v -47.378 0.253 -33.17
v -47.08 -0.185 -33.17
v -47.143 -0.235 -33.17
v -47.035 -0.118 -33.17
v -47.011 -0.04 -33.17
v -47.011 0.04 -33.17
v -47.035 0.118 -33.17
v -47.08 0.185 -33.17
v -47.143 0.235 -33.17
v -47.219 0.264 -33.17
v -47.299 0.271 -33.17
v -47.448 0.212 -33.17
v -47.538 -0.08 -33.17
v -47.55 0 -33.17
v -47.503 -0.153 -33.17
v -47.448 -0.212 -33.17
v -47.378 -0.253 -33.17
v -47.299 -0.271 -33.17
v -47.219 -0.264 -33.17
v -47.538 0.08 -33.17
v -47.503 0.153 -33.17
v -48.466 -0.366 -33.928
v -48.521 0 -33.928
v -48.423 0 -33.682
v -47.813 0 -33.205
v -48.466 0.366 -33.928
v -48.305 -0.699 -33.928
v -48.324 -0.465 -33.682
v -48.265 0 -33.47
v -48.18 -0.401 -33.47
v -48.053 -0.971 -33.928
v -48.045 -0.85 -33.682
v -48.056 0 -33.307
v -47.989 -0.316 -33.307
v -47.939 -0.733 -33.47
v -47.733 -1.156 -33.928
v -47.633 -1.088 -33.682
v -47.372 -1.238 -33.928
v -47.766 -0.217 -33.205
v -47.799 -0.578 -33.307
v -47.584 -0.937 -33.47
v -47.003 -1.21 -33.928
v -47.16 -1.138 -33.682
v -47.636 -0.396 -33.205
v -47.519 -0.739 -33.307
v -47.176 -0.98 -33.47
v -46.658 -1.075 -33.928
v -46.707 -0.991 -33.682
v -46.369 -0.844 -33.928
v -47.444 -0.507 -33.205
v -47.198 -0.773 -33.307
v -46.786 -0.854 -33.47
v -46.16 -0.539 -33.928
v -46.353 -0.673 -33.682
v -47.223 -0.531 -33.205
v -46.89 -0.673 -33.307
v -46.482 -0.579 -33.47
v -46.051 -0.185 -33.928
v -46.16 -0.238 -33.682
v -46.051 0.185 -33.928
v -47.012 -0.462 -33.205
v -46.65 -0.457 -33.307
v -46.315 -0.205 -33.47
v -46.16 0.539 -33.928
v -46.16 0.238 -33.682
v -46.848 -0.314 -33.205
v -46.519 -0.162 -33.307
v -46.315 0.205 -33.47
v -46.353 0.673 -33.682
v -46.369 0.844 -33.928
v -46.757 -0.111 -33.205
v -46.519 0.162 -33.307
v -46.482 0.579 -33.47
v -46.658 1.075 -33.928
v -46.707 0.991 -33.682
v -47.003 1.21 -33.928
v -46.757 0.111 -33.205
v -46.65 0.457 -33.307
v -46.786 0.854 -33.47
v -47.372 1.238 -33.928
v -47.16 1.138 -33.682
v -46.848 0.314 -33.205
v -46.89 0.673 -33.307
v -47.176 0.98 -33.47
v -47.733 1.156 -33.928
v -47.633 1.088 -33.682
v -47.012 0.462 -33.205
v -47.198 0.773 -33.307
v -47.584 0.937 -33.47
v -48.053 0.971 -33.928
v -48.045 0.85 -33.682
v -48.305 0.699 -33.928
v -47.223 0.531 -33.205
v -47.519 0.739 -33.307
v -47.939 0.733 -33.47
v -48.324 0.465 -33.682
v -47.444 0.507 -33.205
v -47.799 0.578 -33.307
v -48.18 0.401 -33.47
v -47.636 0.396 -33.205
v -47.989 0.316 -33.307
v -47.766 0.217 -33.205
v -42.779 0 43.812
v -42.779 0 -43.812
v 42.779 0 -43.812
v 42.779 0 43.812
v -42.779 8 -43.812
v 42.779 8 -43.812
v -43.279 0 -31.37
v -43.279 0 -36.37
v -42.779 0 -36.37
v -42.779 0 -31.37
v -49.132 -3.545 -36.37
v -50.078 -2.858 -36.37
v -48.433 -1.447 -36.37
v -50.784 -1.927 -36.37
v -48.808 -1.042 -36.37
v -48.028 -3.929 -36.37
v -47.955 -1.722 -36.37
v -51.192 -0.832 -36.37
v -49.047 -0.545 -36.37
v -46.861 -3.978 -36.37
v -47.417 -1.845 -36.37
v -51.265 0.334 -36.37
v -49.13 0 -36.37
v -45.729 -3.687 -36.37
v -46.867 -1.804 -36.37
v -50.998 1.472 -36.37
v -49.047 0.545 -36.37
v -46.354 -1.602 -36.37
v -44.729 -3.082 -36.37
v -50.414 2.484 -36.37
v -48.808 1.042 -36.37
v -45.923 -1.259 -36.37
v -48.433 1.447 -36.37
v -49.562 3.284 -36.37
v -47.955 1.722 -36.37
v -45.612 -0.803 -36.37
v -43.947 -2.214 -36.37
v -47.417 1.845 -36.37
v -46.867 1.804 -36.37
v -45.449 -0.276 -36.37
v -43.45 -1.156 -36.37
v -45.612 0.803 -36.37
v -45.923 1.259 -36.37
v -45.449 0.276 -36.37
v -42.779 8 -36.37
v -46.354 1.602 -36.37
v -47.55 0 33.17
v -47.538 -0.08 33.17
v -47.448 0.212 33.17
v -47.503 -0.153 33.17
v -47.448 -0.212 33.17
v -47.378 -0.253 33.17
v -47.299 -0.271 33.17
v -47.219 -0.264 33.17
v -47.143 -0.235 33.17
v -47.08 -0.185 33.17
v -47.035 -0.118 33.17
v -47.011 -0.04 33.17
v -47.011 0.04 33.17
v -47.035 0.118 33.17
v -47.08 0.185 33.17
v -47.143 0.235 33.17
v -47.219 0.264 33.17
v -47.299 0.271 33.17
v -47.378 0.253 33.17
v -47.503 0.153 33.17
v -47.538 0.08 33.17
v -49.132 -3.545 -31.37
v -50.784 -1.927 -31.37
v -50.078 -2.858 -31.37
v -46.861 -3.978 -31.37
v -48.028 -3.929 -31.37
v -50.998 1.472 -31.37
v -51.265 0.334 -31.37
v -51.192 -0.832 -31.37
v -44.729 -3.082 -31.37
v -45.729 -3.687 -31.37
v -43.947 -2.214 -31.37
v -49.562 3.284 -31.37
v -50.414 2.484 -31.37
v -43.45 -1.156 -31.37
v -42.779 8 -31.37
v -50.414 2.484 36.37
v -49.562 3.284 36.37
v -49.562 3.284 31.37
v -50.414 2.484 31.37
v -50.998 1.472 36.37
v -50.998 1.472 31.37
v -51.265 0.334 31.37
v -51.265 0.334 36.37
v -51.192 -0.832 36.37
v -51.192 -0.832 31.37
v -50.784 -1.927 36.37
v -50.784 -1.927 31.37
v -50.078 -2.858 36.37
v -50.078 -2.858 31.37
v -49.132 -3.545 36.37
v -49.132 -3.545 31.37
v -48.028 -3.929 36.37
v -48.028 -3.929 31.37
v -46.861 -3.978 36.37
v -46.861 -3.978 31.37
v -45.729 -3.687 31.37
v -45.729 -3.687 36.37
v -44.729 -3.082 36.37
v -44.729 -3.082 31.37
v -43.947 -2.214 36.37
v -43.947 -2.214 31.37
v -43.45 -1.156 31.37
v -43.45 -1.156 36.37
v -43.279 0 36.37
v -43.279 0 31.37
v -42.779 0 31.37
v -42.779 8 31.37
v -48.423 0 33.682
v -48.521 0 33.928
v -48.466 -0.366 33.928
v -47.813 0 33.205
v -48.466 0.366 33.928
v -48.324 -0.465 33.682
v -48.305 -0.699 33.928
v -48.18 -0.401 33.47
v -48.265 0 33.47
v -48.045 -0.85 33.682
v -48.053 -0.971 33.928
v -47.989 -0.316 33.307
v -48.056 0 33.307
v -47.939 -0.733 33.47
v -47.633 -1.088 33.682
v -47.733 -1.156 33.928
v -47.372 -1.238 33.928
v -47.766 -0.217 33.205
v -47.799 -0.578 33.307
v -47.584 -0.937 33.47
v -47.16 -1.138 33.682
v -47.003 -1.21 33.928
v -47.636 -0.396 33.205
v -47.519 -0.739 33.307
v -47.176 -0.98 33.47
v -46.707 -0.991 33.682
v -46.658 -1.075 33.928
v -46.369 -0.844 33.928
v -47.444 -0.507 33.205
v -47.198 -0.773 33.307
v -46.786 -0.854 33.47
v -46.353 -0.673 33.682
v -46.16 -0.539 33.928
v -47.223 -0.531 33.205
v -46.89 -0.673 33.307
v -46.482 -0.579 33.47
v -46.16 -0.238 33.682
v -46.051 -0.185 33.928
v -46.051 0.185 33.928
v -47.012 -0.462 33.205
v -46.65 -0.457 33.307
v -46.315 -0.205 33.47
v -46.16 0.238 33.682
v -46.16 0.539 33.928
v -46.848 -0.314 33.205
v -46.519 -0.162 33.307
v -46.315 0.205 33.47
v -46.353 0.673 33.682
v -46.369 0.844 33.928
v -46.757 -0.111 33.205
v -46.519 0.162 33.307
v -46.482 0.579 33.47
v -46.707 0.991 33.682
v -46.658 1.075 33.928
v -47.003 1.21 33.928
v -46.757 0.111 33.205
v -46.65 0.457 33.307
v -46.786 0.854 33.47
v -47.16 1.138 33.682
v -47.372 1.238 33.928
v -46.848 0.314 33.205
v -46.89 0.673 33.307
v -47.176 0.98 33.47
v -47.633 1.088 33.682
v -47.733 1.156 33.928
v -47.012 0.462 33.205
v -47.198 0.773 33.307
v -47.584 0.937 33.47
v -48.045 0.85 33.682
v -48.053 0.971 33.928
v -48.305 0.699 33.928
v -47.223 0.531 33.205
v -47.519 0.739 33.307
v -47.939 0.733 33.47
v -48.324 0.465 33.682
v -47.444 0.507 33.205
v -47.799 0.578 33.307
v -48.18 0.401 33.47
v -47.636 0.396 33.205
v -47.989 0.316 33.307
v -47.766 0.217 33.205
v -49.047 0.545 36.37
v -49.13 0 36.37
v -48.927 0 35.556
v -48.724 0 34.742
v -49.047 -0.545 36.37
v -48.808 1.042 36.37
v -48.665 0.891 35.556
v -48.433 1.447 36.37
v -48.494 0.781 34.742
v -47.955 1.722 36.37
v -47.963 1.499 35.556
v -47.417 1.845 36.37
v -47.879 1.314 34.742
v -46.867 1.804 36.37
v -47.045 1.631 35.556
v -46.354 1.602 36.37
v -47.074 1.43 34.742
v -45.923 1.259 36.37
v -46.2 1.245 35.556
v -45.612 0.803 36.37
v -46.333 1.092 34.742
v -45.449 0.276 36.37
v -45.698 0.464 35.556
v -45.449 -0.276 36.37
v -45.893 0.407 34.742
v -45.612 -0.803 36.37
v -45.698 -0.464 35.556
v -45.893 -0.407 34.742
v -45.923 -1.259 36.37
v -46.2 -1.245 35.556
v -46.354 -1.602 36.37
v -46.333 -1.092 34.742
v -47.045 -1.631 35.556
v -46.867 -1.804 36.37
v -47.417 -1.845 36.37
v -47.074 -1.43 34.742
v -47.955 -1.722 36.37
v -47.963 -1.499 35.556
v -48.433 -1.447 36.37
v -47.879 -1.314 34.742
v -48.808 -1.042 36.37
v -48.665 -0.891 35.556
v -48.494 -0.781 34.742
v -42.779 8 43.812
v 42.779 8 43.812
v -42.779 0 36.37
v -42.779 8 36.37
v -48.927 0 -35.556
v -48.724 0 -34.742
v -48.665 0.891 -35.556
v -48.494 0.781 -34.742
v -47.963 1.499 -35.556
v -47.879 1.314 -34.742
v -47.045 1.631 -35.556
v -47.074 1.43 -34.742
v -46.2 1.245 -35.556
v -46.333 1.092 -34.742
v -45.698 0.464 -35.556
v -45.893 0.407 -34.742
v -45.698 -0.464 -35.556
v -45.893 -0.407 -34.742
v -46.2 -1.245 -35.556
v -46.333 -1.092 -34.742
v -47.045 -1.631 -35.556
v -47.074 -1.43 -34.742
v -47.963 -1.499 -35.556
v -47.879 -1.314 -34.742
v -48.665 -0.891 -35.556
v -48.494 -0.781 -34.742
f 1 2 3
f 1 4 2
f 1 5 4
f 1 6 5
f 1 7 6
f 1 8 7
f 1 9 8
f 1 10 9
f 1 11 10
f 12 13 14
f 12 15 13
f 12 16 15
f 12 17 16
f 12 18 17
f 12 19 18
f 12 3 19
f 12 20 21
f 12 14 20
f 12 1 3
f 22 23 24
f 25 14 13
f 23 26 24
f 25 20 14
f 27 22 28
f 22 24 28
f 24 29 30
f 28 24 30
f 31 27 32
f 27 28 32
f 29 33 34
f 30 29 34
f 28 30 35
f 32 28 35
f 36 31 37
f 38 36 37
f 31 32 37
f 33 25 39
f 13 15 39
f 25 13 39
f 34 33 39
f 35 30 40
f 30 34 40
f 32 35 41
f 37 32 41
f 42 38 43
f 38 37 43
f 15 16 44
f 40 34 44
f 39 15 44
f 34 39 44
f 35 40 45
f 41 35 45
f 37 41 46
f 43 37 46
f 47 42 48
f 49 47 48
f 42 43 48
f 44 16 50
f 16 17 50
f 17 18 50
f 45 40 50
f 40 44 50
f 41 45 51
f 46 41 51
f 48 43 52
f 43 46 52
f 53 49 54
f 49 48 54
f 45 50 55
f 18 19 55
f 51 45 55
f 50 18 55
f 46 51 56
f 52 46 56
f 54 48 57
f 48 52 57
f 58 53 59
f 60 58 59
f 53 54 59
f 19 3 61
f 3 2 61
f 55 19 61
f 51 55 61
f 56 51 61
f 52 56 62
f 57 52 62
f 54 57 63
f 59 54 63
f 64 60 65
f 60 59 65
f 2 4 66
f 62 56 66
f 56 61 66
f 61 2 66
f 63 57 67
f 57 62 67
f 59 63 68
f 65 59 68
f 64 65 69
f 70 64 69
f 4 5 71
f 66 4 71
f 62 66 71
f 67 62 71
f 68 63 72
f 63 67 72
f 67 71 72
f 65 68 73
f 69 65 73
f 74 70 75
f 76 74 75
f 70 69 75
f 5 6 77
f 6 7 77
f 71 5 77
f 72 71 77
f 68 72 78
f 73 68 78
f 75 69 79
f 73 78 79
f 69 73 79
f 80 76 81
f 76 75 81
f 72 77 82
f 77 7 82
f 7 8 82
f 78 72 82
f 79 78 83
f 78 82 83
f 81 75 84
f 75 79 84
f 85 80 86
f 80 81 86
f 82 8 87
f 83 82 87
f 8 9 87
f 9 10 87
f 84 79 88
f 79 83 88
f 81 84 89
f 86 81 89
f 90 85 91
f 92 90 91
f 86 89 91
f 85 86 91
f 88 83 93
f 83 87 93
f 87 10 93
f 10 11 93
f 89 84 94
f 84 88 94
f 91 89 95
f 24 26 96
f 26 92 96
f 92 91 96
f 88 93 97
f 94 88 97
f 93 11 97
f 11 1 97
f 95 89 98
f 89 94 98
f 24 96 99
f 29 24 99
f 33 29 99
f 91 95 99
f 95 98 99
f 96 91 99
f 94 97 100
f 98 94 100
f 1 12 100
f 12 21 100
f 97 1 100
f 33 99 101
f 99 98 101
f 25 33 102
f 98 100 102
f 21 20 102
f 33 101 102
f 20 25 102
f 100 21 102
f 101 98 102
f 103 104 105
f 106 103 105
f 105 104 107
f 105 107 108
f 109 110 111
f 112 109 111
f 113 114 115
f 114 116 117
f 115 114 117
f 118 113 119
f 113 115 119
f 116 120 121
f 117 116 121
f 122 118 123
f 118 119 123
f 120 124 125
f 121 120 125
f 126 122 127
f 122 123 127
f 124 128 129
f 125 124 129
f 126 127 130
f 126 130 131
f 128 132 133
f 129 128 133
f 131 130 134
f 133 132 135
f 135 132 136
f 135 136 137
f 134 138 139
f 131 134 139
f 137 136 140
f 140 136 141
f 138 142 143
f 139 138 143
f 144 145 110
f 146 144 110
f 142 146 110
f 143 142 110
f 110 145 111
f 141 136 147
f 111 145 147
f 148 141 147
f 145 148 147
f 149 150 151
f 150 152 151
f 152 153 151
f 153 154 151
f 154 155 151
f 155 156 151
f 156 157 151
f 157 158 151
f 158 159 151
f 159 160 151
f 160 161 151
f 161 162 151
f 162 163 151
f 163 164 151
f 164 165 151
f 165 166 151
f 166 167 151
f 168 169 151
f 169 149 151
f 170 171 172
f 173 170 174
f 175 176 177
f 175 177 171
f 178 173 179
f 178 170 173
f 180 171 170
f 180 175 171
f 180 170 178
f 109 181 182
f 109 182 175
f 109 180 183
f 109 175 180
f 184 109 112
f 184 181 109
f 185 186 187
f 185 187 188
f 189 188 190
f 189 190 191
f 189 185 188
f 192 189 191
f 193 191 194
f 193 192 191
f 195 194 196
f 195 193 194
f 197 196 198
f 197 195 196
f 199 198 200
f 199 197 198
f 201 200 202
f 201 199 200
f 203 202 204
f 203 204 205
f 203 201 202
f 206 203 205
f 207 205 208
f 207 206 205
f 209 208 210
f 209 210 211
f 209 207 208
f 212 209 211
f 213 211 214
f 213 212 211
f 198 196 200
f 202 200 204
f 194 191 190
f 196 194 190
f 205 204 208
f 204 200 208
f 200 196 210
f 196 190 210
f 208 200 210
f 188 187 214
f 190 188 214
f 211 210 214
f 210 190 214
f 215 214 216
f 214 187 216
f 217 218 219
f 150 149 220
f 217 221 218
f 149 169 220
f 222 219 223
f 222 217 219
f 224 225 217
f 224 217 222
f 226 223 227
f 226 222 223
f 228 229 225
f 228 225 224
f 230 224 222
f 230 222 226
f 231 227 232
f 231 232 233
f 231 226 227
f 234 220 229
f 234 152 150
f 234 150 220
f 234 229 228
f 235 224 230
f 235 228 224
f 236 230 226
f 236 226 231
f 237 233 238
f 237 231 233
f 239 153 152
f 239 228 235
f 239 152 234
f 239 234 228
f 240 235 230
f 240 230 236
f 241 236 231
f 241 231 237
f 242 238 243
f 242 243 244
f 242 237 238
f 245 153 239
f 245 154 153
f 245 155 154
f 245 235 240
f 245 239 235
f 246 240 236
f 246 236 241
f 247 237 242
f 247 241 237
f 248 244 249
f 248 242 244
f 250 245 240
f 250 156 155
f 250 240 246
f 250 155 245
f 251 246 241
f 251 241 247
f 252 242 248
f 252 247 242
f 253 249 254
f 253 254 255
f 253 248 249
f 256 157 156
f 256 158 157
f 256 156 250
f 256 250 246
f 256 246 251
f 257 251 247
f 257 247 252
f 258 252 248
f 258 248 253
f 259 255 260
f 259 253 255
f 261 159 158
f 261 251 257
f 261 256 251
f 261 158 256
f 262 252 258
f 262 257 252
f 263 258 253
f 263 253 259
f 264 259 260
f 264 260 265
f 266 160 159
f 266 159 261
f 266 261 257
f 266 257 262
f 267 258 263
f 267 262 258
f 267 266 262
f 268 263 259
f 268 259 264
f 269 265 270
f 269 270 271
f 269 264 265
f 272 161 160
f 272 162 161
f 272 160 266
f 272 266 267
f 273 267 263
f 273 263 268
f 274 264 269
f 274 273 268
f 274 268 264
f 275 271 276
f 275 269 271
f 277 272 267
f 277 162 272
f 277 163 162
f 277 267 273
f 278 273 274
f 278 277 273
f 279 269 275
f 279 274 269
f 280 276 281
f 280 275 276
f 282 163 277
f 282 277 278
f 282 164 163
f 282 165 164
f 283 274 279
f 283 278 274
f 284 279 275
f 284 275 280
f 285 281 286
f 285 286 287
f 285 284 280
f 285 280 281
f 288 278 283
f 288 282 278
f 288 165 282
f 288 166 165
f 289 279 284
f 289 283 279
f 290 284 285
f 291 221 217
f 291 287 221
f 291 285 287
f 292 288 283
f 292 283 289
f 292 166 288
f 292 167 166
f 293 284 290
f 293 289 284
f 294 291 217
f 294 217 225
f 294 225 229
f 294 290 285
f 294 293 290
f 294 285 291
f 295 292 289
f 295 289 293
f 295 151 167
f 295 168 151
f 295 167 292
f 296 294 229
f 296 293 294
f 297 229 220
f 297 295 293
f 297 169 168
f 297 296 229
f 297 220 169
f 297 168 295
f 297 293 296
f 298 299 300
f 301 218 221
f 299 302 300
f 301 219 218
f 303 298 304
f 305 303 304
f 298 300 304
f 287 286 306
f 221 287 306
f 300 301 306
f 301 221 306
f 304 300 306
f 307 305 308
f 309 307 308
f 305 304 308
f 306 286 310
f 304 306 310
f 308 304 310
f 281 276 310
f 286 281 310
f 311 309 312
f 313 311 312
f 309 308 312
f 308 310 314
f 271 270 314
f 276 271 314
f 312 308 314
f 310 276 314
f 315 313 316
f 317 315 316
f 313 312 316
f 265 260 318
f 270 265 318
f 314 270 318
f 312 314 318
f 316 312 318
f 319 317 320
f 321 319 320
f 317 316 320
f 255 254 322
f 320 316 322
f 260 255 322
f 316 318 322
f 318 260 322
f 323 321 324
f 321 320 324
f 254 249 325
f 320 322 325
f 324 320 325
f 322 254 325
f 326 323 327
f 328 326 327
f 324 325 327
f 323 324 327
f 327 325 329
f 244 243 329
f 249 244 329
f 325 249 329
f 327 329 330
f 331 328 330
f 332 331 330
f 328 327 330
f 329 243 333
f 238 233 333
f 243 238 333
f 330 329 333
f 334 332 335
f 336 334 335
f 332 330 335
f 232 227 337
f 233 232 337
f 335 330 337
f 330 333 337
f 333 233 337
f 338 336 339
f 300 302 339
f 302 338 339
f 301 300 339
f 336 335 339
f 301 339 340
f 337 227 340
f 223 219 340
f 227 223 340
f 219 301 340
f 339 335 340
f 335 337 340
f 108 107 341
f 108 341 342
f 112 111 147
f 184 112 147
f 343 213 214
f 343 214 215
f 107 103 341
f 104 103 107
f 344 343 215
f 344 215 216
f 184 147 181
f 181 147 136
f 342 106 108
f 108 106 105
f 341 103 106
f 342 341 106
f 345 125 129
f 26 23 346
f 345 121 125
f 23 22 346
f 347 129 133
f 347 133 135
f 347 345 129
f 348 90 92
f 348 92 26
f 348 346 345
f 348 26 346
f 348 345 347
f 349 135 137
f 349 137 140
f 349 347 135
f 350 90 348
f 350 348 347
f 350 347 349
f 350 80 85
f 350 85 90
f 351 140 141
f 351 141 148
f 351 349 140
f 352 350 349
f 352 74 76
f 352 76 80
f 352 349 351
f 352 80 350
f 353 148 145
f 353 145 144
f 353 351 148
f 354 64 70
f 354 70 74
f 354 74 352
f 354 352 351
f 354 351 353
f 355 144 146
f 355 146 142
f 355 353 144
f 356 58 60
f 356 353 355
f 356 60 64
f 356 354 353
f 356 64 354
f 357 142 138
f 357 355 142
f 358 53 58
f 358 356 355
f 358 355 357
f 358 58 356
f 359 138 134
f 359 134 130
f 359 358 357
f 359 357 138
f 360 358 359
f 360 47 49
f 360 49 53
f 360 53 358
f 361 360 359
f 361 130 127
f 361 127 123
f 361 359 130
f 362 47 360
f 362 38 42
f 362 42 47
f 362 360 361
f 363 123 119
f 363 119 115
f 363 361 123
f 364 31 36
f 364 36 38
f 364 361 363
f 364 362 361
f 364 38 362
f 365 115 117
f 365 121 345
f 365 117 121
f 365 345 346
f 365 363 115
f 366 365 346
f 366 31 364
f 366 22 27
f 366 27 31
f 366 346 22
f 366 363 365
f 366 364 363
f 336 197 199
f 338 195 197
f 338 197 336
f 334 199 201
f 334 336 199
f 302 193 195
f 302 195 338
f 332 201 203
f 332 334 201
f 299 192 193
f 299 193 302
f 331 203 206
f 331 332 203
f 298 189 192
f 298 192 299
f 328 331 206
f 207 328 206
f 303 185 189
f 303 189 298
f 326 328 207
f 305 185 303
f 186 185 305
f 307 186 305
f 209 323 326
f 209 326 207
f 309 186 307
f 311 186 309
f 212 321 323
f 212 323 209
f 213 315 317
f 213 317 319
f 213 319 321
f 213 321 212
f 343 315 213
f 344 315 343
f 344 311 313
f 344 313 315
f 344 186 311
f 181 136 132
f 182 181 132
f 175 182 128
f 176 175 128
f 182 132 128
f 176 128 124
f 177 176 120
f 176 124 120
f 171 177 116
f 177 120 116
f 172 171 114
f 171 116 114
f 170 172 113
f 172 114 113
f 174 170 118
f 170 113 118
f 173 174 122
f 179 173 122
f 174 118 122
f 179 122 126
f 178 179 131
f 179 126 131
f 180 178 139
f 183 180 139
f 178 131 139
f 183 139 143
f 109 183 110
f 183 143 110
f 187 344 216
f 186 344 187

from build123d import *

# Parameters (mm, degrees)
SKETCH1_W           = 85.558202154
SKETCH1_H           = 87.623993754
BOSS_EXTRUDE1_DEPTH = 8
BOSS_EXTRUDE2_START = 0.6
BOSS_EXTRUDE2_DEPTH = 5
SKETCH3_R           = 2
BOSS_EXTRUDE3_DEPTH = 3.8
BOSS_EXTRUDE3_TAPER = 14
FILLET1_R           = 1


with BuildPart() as part:
    # Sketch1 → Boss-Extrude1 (new body)
    with BuildSketch(Plane(origin=(0, 0, 0), x_dir=(1, 0, 0), z_dir=(0, 1, 0))):
        Rectangle(SKETCH1_W, SKETCH1_H)
    extrude(amount=BOSS_EXTRUDE1_DEPTH)


with BuildPart() as body_2:
    # Sketch2 → Boss-Extrude2 (new body)
    with BuildSketch(Plane(origin=(0, 0, 36.97), x_dir=(-1, 0, 0), z_dir=(0, 0, -1)).offset(BOSS_EXTRUDE2_START)):
        with BuildLine():
            Line((42.779101077, 0), (42.779101077, 8))
            Line((42.779101077, 8), (49.562346018, 3.284325279))
            ThreePointArc((49.562346018, 3.284325279), (49.132074395, -3.544924524), (43.279101077, 0))
            Line((43.279101077, 0), (42.779101077, 0))
        make_face()
    extrude(amount=BOSS_EXTRUDE2_DEPTH)


with BuildPart() as body_3:
    # Sketch3 → Boss-Extrude3 (new body)
    with BuildSketch(Plane(origin=(0, 0, 36.97), x_dir=(-1, 0, 0), z_dir=(0, 0, -1))):
        with Locations((47.279101077, 0)):
            Circle(SKETCH3_R)
    extrude(amount=BOSS_EXTRUDE3_DEPTH, taper=BOSS_EXTRUDE3_TAPER)

    # Fillet1
    fillet1_edges = [body_3.edges().sort_by_distance(p)[0] for p in [
        (-46.226547488, 0, 33.17),
    ]]
    fillet(fillet1_edges, radius=FILLET1_R)


with BuildPart() as body_2_1:
    add(body_2.part)

    # Combine1: cut body 3
    add(body_3.part, mode=Mode.SUBTRACT)


with BuildPart() as body_3_2:
    # Mirror1: mirrored copy
    add(body_2_1.part.mirror(Plane(origin=(0, 0, 0), x_dir=(1, 0, 0), z_dir=(0, 0, -1))))


solid = Compound([part.part, body_2_1.part, body_3_2.part])
